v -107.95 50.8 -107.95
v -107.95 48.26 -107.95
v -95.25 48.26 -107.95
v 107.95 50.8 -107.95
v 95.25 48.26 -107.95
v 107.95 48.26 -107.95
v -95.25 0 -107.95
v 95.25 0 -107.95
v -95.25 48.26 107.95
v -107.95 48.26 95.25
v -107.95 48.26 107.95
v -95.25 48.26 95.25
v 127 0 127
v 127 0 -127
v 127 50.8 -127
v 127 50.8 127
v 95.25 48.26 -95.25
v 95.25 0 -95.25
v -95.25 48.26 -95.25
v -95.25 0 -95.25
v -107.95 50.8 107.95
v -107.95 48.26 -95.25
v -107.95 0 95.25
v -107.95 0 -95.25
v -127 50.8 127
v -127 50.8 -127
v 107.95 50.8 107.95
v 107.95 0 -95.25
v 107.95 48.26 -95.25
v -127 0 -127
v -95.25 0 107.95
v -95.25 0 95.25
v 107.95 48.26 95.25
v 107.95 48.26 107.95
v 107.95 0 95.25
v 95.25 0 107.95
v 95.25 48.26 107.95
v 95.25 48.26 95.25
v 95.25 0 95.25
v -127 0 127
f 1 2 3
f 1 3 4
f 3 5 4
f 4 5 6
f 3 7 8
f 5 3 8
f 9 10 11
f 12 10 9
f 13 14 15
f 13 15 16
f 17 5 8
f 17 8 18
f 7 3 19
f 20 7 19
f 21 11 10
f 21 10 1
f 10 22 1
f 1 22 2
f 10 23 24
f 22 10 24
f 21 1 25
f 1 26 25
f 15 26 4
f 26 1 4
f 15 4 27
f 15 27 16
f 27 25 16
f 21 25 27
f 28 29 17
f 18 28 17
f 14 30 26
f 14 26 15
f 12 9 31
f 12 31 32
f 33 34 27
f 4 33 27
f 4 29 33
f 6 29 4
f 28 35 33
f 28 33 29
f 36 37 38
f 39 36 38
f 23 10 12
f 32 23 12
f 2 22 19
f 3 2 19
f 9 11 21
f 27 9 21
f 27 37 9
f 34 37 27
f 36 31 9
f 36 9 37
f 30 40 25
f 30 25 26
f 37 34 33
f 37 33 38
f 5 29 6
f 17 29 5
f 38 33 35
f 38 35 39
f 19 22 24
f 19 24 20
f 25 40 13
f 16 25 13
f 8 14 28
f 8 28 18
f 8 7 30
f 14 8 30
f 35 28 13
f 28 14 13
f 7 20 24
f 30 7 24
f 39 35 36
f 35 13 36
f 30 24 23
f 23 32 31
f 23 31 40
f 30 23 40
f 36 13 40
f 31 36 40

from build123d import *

# Parameters (mm, degrees)
SKETCH3_W               = 19.05
SKETCH3_H               = 215.9
BOSS_EXTRUDE1_DEPTH     = 50.8
SKETCH5_W               = 254
SKETCH5_H               = 19.05
BOSS_EXTRUDE2_DEPTH     = 50.8
SKETCH6_W               = 12.7
SKETCH6_H               = 12.7
BOSS_EXTRUDE3_DEPTH     = 48.26
MIRROR3_COPY_1_SKETCH_W = 19.05
MIRROR3_COPY_1_SKETCH_H = 215.9
MIRROR3_COPY_1_DEPTH    = 50.8
MIRROR3_COPY_2_SKETCH_W = 12.7
MIRROR3_COPY_2_SKETCH_H = 12.7
MIRROR3_COPY_2_DEPTH    = 48.26
MIRROR3_COPY_3_SKETCH_W = 19.05
MIRROR3_COPY_3_SKETCH_H = 215.9
MIRROR3_COPY_3_DEPTH    = 50.8


with BuildPart() as part:
    # Sketch3 → Boss-Extrude1 (new body)
    with BuildSketch(Plane(origin=(0, 0, 0), x_dir=(1, 0, 0), z_dir=(0, 1, 0))):
        with Locations((-117.475, 0)):
            Rectangle(SKETCH3_W, SKETCH3_H)
    boss_extrude1 = extrude(amount=BOSS_EXTRUDE1_DEPTH)

    # Sketch5 → Boss-Extrude2 (add)
    with BuildSketch(Plane(origin=(0, 0, 0), x_dir=(1, 0, 0), z_dir=(0, 1, 0))):
        with Locations((0, -117.475)):
            Rectangle(SKETCH5_W, SKETCH5_H)
    boss_extrude2 = extrude(amount=BOSS_EXTRUDE2_DEPTH)

    # Sketch6 → Boss-Extrude3 (add)
    with BuildSketch(Plane(origin=(0, 0, 0), x_dir=(1, 0, 0), z_dir=(0, 1, 0))):
        with Locations((-101.6, -101.6)):
            Rectangle(SKETCH6_W, SKETCH6_H)
    boss_extrude3 = extrude(amount=BOSS_EXTRUDE3_DEPTH)

    # Mirror2: Boss-Extrude1, Boss-Extrude3 across plane
    add(boss_extrude1.mirror(Plane(origin=(0, 0, 0), x_dir=(0, 0, 1), z_dir=(1, 0, 0))))
    add(boss_extrude3.mirror(Plane(origin=(0, 0, 0), x_dir=(0, 0, 1), z_dir=(1, 0, 0))))

    # Mirror3: Boss-Extrude3, Boss-Extrude2 across plane
    add(boss_extrude3.mirror(Plane.XY))
    add(boss_extrude2.mirror(Plane.XY))

    # Mirror3 copy 1 sketch → Mirror3 copy 1 (add)
    with BuildSketch(Plane(origin=(0, 0, 0), x_dir=(-1, 0, 0), z_dir=(0, 1, 0))):
        with Locations((-117.475, 0)):
            Rectangle(MIRROR3_COPY_1_SKETCH_W, MIRROR3_COPY_1_SKETCH_H)
    extrude(amount=MIRROR3_COPY_1_DEPTH)

    # Mirror3 copy 2 sketch → Mirror3 copy 2 (add)
    with BuildSketch(Plane(origin=(0, 0, 0), x_dir=(-1, 0, 0), z_dir=(0, 1, 0))):
        with Locations((-101.6, -101.6)):
            Rectangle(MIRROR3_COPY_2_SKETCH_W, MIRROR3_COPY_2_SKETCH_H)
    extrude(amount=MIRROR3_COPY_2_DEPTH)

    # Mirror3 copy 3 sketch → Mirror3 copy 3 (add)
    with BuildSketch(Plane(origin=(0, 0, 0), x_dir=(1, 0, 0), z_dir=(0, 1, 0))):
        with Locations((-117.475, 0)):
            Rectangle(MIRROR3_COPY_3_SKETCH_W, MIRROR3_COPY_3_SKETCH_H)
    extrude(amount=MIRROR3_COPY_3_DEPTH)


solid = part.part
